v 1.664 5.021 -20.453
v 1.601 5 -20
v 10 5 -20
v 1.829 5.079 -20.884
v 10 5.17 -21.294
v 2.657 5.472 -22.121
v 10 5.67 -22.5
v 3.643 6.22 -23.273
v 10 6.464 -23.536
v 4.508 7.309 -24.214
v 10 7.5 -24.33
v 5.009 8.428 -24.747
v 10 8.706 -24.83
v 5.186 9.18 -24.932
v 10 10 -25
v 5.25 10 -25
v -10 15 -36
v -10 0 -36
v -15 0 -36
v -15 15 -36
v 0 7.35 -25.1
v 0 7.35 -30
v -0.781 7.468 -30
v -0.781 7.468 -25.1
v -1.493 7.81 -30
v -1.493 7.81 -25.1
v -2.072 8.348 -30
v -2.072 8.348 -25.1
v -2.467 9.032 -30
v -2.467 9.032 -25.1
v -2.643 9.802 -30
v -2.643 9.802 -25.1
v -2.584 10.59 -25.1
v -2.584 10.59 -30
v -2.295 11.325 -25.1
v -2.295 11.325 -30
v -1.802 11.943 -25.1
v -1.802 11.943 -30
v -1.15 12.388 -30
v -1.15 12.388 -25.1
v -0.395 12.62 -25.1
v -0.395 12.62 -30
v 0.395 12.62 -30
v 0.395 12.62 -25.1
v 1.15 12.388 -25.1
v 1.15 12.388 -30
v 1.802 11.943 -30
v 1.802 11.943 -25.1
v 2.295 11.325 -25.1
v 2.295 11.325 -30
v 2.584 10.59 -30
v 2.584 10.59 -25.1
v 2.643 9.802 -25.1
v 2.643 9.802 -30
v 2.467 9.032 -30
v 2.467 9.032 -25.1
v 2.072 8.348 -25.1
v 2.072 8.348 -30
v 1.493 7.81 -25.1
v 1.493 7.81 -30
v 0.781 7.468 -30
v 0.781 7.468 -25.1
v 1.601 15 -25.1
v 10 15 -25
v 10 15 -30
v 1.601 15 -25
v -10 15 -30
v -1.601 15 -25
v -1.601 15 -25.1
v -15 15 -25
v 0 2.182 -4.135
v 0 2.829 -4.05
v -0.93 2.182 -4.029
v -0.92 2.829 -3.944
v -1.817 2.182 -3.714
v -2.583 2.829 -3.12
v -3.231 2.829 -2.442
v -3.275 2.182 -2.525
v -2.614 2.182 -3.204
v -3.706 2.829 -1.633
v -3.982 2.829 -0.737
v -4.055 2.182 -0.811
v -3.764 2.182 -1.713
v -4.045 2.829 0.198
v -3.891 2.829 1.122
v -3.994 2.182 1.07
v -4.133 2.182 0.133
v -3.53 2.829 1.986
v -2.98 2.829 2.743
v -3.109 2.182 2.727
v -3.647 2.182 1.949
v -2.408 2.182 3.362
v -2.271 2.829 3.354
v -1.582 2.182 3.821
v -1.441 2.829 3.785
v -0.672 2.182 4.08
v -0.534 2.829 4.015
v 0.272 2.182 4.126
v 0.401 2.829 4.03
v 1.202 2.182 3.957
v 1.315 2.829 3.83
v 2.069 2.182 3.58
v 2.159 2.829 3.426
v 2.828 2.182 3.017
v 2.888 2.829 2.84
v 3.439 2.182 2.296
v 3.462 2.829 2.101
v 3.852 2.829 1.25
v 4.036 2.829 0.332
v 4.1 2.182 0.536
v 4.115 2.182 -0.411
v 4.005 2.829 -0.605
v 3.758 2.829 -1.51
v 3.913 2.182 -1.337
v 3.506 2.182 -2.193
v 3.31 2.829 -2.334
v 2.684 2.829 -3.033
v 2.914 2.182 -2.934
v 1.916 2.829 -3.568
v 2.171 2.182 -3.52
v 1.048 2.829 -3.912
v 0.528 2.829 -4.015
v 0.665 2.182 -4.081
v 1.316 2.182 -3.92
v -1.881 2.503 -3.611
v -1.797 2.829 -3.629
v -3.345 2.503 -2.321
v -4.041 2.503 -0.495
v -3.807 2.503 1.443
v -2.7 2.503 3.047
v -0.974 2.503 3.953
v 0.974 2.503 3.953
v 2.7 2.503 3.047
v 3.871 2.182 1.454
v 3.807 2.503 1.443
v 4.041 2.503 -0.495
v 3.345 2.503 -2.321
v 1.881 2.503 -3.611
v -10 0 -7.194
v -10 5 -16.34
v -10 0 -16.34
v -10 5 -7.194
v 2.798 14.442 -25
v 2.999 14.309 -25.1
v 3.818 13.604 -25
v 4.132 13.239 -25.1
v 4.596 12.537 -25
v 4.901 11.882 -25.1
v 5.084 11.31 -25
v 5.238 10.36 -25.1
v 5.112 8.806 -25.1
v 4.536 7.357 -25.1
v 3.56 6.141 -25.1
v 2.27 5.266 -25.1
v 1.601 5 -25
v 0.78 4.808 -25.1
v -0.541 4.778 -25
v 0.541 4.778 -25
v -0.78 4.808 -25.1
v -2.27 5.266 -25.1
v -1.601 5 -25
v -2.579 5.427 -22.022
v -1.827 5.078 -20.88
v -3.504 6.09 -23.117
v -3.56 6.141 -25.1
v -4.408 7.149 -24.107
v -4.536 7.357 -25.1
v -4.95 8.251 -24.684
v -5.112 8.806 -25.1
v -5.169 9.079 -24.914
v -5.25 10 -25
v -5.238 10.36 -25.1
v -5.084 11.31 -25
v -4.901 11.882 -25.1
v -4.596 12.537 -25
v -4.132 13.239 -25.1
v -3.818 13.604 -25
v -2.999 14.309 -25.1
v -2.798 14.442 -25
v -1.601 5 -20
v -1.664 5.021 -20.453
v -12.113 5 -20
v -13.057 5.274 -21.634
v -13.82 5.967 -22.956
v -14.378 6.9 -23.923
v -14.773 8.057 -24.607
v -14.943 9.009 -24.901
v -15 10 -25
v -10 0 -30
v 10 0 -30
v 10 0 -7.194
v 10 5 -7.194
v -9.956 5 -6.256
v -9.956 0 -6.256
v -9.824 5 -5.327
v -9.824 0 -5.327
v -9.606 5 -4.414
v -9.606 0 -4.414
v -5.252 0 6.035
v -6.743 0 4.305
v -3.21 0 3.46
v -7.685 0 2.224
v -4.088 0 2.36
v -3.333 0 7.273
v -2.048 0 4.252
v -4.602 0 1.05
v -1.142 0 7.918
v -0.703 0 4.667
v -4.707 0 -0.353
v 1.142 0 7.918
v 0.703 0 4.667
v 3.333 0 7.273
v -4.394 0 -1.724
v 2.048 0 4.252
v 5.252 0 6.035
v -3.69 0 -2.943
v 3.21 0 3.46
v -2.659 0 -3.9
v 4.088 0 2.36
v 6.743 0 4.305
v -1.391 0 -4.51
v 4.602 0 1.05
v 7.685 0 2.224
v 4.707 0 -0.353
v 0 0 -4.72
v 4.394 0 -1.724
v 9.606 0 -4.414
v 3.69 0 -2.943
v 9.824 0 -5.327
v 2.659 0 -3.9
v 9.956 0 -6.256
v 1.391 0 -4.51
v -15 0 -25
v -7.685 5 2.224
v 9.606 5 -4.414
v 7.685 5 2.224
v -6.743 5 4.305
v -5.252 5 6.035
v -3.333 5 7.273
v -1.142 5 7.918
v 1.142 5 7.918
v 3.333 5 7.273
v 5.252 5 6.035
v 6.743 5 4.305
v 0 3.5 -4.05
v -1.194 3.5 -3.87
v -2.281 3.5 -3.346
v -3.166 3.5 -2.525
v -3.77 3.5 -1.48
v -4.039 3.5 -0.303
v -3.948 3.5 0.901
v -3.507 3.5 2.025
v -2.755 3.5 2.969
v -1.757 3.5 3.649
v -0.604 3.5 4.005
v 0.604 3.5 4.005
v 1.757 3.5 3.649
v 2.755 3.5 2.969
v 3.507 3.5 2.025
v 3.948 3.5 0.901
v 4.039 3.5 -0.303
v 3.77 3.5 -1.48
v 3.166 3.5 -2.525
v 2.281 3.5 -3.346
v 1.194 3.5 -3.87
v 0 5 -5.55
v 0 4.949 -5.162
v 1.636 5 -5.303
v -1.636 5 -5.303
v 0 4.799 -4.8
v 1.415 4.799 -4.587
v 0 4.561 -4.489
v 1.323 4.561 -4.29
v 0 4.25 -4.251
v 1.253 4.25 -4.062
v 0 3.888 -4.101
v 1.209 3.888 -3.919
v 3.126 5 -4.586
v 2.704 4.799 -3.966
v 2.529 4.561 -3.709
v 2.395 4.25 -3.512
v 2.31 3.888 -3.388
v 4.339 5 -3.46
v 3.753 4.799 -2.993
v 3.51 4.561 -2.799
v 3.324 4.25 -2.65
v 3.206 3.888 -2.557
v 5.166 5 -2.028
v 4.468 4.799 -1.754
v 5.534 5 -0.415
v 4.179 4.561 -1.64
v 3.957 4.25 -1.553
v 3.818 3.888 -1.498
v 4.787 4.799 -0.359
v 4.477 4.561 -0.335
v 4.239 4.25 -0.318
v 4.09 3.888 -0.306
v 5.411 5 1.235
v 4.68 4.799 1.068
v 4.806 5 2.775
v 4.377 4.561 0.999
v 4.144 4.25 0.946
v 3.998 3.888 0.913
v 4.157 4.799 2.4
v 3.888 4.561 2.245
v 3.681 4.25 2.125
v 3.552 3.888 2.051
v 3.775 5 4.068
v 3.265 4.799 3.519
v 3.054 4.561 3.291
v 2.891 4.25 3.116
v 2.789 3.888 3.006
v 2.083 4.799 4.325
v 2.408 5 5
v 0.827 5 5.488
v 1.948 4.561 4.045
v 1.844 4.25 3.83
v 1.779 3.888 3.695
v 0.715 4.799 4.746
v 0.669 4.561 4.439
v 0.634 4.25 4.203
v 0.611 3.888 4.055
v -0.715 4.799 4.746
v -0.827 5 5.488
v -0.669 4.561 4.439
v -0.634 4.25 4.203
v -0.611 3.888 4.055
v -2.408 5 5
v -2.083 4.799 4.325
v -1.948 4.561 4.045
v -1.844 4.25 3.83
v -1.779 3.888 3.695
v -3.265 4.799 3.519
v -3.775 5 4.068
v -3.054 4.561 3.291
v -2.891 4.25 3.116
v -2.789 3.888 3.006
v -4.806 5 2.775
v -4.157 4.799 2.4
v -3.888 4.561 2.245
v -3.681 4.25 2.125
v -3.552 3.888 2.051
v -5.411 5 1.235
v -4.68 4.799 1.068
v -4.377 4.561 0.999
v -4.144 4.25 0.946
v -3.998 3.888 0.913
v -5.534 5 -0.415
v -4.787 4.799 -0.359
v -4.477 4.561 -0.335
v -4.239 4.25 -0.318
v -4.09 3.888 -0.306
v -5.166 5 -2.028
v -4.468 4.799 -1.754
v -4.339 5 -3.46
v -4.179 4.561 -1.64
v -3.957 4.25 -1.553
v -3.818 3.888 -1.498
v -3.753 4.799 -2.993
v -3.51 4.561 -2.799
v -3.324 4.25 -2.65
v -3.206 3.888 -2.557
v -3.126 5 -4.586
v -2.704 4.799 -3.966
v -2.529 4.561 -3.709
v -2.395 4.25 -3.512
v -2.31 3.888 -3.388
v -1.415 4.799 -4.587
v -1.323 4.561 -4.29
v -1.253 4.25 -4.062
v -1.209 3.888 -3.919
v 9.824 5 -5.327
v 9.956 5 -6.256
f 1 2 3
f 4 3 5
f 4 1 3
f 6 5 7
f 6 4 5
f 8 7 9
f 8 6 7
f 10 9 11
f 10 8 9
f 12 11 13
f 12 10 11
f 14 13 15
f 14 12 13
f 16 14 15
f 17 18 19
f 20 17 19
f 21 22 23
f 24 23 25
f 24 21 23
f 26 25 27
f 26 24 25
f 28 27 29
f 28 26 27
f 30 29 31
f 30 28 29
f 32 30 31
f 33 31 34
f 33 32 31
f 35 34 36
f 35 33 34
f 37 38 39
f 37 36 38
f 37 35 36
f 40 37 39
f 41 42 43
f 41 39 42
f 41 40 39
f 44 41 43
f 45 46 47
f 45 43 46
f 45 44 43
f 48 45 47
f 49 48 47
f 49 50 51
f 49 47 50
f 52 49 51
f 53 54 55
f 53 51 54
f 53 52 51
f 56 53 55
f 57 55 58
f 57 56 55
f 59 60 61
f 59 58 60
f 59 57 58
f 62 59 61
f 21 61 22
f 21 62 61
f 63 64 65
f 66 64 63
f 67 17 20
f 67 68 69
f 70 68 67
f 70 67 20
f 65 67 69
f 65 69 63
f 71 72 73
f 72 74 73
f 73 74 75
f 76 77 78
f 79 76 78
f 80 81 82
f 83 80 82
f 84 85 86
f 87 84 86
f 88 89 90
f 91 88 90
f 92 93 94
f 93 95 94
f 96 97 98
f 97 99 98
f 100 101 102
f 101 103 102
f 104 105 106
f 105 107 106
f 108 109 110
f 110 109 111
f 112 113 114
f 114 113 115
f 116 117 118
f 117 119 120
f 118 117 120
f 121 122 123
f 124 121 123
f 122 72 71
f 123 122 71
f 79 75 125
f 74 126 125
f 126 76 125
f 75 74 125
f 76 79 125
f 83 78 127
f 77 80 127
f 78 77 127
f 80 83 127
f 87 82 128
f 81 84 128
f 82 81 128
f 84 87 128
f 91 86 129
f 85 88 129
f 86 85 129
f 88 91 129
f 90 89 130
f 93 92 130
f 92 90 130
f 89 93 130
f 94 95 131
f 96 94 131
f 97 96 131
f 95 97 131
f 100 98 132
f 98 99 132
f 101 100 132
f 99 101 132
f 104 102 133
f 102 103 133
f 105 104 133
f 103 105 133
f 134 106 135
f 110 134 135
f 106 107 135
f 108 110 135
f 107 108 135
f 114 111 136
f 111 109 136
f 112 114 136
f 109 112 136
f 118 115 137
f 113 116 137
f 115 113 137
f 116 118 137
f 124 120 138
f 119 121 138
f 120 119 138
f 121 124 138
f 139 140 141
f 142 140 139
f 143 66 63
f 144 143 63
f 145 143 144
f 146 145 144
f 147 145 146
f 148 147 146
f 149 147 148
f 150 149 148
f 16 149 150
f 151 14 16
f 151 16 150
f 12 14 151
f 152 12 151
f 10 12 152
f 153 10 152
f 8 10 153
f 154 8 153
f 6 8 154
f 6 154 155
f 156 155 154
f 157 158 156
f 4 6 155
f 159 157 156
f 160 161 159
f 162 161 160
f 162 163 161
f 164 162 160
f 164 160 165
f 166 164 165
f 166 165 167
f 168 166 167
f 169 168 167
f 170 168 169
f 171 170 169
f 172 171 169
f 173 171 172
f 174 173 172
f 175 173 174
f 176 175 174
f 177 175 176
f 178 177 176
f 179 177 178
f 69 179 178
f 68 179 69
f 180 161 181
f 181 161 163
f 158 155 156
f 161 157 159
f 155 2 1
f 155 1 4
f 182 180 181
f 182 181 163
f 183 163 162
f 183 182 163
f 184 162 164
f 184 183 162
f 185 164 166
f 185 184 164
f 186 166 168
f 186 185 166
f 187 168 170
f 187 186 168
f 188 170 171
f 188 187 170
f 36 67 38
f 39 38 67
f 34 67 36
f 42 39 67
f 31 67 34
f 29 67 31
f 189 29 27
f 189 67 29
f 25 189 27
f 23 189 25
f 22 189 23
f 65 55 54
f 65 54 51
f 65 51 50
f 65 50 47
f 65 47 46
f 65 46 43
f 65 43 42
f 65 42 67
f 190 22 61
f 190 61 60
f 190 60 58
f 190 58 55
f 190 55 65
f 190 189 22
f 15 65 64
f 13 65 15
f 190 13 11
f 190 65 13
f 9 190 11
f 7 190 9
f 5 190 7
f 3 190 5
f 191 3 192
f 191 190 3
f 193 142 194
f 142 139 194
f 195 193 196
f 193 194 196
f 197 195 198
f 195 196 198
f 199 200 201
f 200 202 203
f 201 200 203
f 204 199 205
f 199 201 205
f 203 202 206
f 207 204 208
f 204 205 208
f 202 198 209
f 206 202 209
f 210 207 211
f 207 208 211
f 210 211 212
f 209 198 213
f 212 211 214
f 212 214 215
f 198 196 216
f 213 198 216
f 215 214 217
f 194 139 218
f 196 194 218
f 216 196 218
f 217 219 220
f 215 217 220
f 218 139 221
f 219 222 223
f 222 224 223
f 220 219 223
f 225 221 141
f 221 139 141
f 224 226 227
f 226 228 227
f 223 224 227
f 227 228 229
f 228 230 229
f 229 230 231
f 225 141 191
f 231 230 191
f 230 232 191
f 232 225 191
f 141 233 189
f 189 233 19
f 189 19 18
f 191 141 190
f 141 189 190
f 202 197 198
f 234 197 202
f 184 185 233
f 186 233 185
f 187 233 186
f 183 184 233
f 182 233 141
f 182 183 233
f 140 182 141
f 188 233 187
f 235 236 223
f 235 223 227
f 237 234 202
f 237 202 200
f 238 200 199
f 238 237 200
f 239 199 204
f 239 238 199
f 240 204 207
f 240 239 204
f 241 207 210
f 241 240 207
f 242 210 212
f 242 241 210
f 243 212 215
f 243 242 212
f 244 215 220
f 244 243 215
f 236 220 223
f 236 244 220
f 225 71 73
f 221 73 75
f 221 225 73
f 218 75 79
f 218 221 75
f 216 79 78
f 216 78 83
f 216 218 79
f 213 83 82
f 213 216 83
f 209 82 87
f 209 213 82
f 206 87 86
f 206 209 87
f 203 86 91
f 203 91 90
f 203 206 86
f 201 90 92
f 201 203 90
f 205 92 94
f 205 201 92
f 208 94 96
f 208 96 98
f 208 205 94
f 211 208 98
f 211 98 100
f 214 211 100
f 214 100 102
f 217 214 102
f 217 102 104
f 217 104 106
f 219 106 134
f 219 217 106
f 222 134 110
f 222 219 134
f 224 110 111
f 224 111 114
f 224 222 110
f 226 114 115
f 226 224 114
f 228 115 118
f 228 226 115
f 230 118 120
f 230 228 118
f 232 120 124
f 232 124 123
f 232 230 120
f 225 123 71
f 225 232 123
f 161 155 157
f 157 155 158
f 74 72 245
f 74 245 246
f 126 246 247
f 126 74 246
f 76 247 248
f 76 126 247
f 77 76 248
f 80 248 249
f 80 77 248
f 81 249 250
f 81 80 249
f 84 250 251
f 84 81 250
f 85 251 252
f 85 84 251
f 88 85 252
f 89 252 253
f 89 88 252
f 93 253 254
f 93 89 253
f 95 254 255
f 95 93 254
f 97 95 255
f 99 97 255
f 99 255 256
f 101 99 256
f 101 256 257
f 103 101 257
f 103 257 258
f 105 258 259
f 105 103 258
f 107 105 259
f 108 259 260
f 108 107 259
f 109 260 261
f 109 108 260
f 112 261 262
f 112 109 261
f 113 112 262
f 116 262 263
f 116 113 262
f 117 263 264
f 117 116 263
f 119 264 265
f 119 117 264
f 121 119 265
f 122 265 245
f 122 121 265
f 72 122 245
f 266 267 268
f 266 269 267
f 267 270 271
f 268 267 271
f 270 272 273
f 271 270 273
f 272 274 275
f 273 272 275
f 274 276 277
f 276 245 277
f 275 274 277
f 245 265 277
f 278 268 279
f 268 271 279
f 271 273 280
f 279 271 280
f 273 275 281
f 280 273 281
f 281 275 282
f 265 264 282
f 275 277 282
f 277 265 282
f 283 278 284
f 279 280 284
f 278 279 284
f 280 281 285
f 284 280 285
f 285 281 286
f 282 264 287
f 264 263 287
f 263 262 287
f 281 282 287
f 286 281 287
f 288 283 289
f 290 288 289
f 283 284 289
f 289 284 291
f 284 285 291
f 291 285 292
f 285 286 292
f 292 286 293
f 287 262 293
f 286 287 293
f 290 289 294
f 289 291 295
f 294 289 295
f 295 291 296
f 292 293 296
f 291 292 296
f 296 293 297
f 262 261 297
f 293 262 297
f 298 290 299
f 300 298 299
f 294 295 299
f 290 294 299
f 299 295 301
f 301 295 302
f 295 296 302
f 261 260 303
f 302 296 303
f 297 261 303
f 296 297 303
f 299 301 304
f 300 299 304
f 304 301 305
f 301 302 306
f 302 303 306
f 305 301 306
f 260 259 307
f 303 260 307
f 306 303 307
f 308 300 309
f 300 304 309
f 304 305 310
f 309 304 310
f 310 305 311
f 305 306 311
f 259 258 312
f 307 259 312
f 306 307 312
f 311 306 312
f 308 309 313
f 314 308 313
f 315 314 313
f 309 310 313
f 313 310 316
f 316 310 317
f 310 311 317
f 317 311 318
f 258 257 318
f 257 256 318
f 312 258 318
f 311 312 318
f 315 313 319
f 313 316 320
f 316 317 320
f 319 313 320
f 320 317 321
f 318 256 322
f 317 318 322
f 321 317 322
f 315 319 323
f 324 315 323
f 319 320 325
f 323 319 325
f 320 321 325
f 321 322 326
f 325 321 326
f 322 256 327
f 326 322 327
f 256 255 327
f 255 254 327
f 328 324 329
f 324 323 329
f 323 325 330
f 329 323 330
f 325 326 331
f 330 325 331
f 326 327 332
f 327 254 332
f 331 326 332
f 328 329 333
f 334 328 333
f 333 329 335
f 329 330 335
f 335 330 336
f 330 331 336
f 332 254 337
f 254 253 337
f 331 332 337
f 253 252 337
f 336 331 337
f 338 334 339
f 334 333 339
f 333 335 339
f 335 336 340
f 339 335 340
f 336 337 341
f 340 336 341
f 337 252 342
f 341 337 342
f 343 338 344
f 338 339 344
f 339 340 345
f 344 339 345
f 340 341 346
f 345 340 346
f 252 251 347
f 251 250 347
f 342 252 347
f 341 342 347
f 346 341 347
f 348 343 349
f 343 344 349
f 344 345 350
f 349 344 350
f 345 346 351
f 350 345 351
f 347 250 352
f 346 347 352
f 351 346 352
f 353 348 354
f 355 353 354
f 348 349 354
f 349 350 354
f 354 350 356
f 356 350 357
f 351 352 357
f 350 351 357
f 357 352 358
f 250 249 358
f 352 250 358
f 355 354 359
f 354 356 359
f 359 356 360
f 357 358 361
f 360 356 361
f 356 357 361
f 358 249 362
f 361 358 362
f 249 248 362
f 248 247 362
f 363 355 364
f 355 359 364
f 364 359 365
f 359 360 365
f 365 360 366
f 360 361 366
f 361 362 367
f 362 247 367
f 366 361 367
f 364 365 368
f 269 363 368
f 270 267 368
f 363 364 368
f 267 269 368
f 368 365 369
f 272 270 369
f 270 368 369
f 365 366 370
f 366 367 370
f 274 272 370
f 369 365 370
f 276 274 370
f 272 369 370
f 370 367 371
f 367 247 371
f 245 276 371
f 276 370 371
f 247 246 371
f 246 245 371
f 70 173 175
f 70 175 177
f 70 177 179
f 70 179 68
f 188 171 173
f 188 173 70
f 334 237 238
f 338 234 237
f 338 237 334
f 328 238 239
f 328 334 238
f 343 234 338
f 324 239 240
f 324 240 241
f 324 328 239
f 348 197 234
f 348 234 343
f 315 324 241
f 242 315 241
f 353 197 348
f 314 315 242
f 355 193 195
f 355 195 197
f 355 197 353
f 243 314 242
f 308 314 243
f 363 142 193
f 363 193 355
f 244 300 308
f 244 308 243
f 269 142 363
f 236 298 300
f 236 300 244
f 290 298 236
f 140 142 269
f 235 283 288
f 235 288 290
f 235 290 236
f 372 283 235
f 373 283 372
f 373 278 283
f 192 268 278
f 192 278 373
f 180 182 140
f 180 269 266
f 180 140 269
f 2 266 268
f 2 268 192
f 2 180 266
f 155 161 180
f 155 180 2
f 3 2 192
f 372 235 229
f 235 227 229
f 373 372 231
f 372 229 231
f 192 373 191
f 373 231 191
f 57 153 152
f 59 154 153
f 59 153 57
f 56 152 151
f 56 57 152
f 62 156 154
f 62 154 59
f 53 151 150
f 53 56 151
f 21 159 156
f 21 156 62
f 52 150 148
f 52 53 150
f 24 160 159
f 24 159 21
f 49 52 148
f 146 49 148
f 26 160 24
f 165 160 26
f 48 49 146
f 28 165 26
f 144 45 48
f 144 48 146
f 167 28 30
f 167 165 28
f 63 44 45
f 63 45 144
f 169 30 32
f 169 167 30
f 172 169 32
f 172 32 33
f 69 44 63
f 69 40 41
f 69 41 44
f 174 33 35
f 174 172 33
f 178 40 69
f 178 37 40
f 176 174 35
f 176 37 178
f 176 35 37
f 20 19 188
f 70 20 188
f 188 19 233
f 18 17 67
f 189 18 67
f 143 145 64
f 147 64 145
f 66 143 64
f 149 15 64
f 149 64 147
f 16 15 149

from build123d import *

# Parameters (mm, degrees)
BOSS_EXTRUDE1_DEPTH = 5
SKETCH2_W           = 25
SKETCH2_H           = 11
BOSS_EXTRUDE2_DEPTH = 10
SKETCH3_W           = 20
SKETCH3_H           = 6
CUT_EXTRUDE1_DEPTH  = 16
FILLET1_R           = 1.5
FILLET2_R           = 2.5
FILLET3_R           = 5
FILLET4_R           = 10


with BuildPart() as part:
    # Sketch1 → Boss-Extrude1 (new body)
    with BuildSketch(Plane(origin=(0, 5, 0), x_dir=(1, 0, 0), z_dir=(0, 1, 0))):
        with BuildLine():
            Line((10, 5.775897312), (10, 36))
            Line((10, 36), (-15, 36))
            Line((-15, 36), (-15, 25))
            Line((-15, 25), (-10, 16.339745962))
            Line((-10, 16.339745962), (-10, 5.775897312))
            Line((-10, 5.775897312), (-7.684618874, -2.224102688))
            ThreePointArc((-7.684618874, -2.224102688), (0, -8), (7.684618874, -2.224102688))
            Line((7.684618874, -2.224102688), (10, 5.775897312))
        make_face()
    extrude(amount=-BOSS_EXTRUDE1_DEPTH)

    # Sketch2 → Boss-Extrude2 (add)
    with BuildSketch(Plane(origin=(0, 5, 0), x_dir=(-1, 0, 0), z_dir=(0, 1, 0))):
        with Locations((2.5, -30.5)):
            Rectangle(SKETCH2_W, SKETCH2_H)
    extrude(amount=BOSS_EXTRUDE2_DEPTH)

    # Sketch3 → Cut-Extrude1 (cut, through all)
    with BuildSketch(Plane.XZ):
        with Locations((0, -33)):
            Rectangle(SKETCH3_W, SKETCH3_H)
    extrude(amount=-CUT_EXTRUDE1_DEPTH, mode=Mode.SUBTRACT)

    # Sketch6 → Ø8.1 (8.1) Diameter Hole1 (revolve, cut)
    with BuildSketch(Plane(origin=(0, 0, 0), x_dir=(0, 0, -1), z_dir=(1, 0, 0))):
        Polygon((0, 0), (0, 15), (4.05, 15), (4.05, 2.5), (4.719872981, 0), align=None)
    revolve(axis=Axis((0, -6.35, 0), (0, 1, 0)), mode=Mode.SUBTRACT)

    # Sketch4 → CBORE for M5 SBHCS1 (revolve, cut)
    with BuildSketch(Plane(origin=(0, 10, -25), x_dir=(0, -1, 0), z_dir=(1, 0, 0))):
        Polygon((0, 0), (0, 11), (2.65, 11), (2.65, 0.1), (5.25, 0.1), (5.25, 0), align=None)
    revolve(axis=Axis((0, 10, -18.65), (0, 0, -1)), mode=Mode.SUBTRACT)

    # Fillet1
    fillet1_edges = [part.edges().sort_by_distance(p)[0] for p in [
        (0, 5, 4.05),
    ]]
    fillet(fillet1_edges, radius=FILLET1_R)

    # Fillet2
    fillet2_edges = [part.edges().sort_by_distance(p)[0] for p in [
        (0, 2.5, 4.05),
    ]]
    fillet(fillet2_edges, radius=FILLET2_R)

    # Fillet3
    fillet3_edges = [part.edges().sort_by_distance(p)[0] for p in [
        (-8.30039053, 5, -25),
        (5.80039053, 5, -25),
    ]]
    fillet(fillet3_edges, radius=FILLET3_R)

    # Fillet4
    fillet4_edges = [part.edges().sort_by_distance(p)[0] for p in [
        (-10, 2.5, -5.775897312),
        (10, 2.5, -5.775897312),
    ]]
    fillet(fillet4_edges, radius=FILLET4_R)


solid = part.part
